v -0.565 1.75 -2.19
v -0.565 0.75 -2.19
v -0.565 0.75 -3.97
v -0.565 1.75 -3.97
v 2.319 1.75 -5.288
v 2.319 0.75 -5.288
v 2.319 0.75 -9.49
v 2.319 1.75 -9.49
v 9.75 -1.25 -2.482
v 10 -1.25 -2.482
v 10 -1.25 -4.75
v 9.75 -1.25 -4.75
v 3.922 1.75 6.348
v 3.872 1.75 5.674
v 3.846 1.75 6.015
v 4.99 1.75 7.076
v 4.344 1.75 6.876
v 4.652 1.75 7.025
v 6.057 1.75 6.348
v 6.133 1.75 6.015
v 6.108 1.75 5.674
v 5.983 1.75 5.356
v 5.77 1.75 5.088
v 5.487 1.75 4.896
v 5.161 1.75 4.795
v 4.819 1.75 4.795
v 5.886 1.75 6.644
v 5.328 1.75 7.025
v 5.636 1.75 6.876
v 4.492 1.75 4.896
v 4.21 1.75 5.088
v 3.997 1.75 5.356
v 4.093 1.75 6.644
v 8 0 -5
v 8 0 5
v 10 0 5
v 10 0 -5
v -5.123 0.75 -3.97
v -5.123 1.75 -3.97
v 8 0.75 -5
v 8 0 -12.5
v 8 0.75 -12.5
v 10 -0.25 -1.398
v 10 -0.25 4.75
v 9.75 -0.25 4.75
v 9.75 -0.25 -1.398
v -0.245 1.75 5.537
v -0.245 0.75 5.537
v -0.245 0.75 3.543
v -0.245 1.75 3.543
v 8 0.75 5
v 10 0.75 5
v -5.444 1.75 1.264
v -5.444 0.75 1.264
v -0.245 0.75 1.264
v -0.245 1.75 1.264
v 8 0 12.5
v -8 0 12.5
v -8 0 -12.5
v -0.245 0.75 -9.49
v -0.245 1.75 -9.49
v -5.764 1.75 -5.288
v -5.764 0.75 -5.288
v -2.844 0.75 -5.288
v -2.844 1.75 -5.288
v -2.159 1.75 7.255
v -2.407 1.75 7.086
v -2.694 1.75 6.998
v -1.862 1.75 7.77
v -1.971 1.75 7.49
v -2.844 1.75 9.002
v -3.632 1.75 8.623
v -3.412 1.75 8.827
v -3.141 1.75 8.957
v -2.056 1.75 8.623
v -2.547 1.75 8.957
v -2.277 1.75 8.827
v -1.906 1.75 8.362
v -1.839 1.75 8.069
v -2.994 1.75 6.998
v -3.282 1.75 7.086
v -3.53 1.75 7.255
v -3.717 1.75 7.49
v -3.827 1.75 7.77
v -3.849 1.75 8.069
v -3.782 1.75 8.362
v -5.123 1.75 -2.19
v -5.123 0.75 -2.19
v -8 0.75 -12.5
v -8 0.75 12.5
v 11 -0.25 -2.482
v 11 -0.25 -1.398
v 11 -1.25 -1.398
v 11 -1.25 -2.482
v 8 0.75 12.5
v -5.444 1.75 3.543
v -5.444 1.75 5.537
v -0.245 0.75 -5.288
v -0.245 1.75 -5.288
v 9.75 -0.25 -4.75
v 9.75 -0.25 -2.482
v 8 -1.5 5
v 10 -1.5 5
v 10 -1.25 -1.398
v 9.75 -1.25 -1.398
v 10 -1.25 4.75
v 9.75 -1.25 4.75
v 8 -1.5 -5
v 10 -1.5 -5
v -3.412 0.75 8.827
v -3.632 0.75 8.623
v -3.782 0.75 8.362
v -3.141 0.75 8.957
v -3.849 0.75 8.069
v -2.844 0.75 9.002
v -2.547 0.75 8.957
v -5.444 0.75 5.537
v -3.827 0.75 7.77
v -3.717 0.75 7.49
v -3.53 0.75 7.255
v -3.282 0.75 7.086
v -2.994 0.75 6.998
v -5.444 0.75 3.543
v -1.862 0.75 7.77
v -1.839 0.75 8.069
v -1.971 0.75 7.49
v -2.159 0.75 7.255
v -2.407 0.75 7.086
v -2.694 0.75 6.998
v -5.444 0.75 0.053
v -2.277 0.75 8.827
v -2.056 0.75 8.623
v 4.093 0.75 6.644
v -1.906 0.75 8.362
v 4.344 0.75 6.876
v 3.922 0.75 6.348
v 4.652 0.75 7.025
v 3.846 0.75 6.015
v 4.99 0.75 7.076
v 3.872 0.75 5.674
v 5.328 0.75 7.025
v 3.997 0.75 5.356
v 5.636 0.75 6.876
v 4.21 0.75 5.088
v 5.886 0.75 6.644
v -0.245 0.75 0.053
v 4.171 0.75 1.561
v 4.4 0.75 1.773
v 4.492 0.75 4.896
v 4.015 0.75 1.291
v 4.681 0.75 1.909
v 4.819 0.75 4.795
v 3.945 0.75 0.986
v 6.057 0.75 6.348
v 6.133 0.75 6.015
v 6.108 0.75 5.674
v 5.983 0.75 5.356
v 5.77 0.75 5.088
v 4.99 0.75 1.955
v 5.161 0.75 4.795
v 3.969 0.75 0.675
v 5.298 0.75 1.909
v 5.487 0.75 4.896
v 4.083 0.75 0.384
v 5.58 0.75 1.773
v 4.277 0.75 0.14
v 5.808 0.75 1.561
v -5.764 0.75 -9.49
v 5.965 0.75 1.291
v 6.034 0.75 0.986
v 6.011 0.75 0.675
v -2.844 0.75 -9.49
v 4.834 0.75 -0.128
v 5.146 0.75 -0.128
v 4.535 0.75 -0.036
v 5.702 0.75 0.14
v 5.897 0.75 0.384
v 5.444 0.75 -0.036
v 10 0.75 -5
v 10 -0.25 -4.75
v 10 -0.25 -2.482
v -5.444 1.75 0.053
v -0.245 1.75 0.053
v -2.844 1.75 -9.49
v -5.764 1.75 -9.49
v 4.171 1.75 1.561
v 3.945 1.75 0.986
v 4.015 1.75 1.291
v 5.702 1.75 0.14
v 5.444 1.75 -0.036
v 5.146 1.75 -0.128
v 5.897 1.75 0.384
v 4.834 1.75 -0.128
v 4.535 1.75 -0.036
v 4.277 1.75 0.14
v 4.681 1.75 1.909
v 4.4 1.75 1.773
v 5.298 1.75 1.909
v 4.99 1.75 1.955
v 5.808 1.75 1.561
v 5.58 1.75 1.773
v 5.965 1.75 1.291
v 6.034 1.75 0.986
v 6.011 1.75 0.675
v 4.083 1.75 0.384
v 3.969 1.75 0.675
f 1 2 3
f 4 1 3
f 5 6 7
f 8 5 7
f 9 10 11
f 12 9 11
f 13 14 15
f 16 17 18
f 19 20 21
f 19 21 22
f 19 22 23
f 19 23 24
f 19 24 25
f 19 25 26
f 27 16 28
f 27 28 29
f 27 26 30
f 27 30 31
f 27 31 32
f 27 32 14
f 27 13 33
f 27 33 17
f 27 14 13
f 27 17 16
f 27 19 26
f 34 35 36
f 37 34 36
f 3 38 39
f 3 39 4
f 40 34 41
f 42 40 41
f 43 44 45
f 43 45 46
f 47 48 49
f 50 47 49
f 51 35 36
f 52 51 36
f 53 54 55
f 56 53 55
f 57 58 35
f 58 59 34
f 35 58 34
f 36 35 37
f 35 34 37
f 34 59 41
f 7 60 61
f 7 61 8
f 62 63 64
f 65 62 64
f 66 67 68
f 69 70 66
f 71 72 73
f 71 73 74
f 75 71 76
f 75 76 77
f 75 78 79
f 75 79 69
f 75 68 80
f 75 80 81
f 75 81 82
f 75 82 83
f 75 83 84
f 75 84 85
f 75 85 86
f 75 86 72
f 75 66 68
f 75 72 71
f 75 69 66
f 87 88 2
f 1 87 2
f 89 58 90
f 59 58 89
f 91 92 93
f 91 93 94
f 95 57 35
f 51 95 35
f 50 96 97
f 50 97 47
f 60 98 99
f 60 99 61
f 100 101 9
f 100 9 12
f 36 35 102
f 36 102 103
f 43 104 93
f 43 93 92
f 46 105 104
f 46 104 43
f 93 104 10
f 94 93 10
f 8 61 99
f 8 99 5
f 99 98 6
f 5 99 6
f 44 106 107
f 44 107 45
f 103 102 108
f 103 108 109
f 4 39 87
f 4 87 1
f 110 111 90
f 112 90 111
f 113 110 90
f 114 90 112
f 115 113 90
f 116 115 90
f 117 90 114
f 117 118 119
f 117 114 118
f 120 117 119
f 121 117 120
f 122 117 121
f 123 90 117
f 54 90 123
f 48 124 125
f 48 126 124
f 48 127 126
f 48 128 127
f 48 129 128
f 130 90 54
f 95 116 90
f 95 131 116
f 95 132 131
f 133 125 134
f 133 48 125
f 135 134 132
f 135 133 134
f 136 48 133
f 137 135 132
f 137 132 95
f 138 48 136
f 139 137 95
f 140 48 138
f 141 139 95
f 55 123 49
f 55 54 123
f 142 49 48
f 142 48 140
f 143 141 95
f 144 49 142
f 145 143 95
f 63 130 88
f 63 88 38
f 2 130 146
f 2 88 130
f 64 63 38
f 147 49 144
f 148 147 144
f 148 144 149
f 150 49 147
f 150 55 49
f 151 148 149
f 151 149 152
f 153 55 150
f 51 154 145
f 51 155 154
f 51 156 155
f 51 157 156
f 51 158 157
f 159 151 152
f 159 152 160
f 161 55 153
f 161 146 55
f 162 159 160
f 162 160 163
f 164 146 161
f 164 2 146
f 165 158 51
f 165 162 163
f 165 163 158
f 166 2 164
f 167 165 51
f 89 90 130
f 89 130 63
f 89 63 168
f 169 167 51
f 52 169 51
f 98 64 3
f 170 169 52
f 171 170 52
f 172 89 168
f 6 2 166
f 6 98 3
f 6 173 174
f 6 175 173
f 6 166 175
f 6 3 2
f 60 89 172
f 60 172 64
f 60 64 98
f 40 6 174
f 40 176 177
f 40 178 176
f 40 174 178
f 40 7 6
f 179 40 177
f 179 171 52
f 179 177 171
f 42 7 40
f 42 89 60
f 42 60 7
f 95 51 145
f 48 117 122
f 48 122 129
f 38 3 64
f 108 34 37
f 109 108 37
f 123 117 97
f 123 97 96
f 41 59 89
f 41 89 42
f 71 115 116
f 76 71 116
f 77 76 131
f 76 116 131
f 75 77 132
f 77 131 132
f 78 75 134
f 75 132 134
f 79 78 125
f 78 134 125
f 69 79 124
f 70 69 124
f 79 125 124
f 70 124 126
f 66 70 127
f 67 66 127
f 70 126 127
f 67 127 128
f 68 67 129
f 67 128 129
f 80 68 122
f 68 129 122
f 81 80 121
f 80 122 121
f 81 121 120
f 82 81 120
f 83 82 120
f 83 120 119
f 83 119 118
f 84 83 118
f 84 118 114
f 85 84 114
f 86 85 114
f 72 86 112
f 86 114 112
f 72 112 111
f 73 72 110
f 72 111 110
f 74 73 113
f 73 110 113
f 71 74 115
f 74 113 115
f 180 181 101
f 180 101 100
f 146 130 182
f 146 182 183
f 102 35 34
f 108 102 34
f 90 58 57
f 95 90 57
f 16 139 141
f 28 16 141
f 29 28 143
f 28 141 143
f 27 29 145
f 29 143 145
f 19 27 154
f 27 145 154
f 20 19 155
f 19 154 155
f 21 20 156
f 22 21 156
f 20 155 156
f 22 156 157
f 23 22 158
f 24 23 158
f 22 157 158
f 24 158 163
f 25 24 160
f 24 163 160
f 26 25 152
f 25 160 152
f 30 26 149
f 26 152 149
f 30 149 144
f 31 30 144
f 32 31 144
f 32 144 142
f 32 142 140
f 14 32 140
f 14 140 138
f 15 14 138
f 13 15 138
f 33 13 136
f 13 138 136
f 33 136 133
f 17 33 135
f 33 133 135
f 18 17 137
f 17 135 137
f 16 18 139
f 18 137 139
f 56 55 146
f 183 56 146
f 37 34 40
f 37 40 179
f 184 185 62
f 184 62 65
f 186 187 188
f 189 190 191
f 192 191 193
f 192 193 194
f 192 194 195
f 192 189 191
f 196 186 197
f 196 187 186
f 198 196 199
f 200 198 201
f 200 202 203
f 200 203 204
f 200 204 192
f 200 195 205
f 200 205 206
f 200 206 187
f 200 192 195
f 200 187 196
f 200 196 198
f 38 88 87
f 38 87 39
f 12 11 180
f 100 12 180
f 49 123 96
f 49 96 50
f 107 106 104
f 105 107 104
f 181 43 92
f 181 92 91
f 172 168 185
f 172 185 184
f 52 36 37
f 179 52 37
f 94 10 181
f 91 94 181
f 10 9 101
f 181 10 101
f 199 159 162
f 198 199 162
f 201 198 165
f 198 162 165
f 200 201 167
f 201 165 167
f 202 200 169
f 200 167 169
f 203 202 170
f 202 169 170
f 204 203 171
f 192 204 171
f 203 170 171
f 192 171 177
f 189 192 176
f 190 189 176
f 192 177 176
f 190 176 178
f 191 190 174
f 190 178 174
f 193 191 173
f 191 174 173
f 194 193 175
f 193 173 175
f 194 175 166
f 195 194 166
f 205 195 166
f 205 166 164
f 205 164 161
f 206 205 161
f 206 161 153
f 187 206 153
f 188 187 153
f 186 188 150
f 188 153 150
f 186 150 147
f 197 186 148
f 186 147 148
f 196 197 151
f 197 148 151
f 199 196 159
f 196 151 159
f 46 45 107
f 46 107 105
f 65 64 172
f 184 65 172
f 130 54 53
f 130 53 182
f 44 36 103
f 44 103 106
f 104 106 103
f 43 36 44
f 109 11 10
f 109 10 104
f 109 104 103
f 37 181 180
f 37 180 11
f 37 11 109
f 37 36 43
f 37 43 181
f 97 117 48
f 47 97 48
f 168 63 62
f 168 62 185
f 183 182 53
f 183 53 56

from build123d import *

# Parameters (mm, degrees)
BOSS_EXTRUDE1_DEPTH = 0.75
SKETCH1_3_W         = 2
SKETCH1_3_H         = 10
BOSS_EXTRUDE2_DEPTH = 1.5
SKETCH3_W           = 9.5
SKETCH3_H           = 1
CUT_EXTRUDE1_DEPTH  = 0.25
SKETCH5_W           = 1.083860034
SKETCH5_H           = 1
BOSS_EXTRUDE3_DEPTH = 1.25
SKETCH6_R           = 1.047284205
SKETCH6_R_2         = 1.146689612
SKETCH6_R_3         = 1.007796297
SKETCH6_W           = 2.919915963
SKETCH6_H           = 4.201830289
SKETCH6_W_2         = 2.563828651
SKETCH6_W_3         = 4.557917602
SKETCH6_H_2         = 1.780436563
SKETCH6_W_4         = 5.198874764
SKETCH6_H_3         = 1.210696863
SKETCH6_H_4         = 1.994088951
BOSS_EXTRUDE4_DEPTH = 1


with BuildPart() as part:
    # Sketch1 → Boss-Extrude1 (new body)
    with BuildSketch(Plane(origin=(0, 0, 0), x_dir=(1, 0, 0), z_dir=(0, 1, 0))):
        Polygon((8, 12.5), (-8, 12.5), (-8, -12.5), (8, -12.5), (8, -5), (10, -5), (10, 5), (8, 5), align=None)
    extrude(amount=BOSS_EXTRUDE1_DEPTH)

    # Sketch6 → Boss-Extrude4 (add)
    with BuildSketch(Plane(origin=(0, 0.75, 0), x_dir=(1, 0, 0), z_dir=(0, 1, 0))):
        with Locations((4.989655664, -0.908022647)):
            Circle(SKETCH6_R)
        with Locations((4.989655664, -5.928853755)):
            Circle(SKETCH6_R_2)
        with Locations((-2.844265214, -7.994160168)):
            Circle(SKETCH6_R_3)
        with Locations((-4.304223196, 7.388811737)):
            Rectangle(SKETCH6_W, SKETCH6_H)
        with Locations((1.037086494, 7.388811737)):
            Rectangle(SKETCH6_W_2, SKETCH6_H)
        with Locations((-2.844265214, 3.080155255)):
            Rectangle(SKETCH6_W_3, SKETCH6_H_2)
        with Locations((-2.844265214, -0.658761529)):
            Rectangle(SKETCH6_W_4, SKETCH6_H_3)
        with Locations((-2.844265214, -4.540113236)):
            Rectangle(SKETCH6_W_4, SKETCH6_H_4)
    extrude(amount=BOSS_EXTRUDE4_DEPTH)


with BuildPart() as body_2:
    # Sketch1<3> → Boss-Extrude2 (new body)
    with BuildSketch(Plane(origin=(0, 0, 0), x_dir=(1, 0, 0), z_dir=(0, 1, 0))):
        with Locations((9, 0)):
            Rectangle(SKETCH1_3_W, SKETCH1_3_H)
    extrude(amount=-BOSS_EXTRUDE2_DEPTH)

    # Sketch3 → Cut-Extrude1 (cut)
    with BuildSketch(Plane(origin=(10, 0, 0), x_dir=(0, 0, -1), z_dir=(1, 0, 0))):
        with Locations((0, -0.75)):
            Rectangle(SKETCH3_W, SKETCH3_H)
    extrude(amount=-CUT_EXTRUDE1_DEPTH, mode=Mode.SUBTRACT)

    # Sketch5 → Boss-Extrude3 (add)
    with BuildSketch(Plane(origin=(9.75, 0, 0), x_dir=(0, 0, -1), z_dir=(1, 0, 0))):
        with Locations((1.940310185, -0.75)):
            Rectangle(SKETCH5_W, SKETCH5_H)
    extrude(amount=BOSS_EXTRUDE3_DEPTH)


solid = Compound([part.part, body_2.part])
